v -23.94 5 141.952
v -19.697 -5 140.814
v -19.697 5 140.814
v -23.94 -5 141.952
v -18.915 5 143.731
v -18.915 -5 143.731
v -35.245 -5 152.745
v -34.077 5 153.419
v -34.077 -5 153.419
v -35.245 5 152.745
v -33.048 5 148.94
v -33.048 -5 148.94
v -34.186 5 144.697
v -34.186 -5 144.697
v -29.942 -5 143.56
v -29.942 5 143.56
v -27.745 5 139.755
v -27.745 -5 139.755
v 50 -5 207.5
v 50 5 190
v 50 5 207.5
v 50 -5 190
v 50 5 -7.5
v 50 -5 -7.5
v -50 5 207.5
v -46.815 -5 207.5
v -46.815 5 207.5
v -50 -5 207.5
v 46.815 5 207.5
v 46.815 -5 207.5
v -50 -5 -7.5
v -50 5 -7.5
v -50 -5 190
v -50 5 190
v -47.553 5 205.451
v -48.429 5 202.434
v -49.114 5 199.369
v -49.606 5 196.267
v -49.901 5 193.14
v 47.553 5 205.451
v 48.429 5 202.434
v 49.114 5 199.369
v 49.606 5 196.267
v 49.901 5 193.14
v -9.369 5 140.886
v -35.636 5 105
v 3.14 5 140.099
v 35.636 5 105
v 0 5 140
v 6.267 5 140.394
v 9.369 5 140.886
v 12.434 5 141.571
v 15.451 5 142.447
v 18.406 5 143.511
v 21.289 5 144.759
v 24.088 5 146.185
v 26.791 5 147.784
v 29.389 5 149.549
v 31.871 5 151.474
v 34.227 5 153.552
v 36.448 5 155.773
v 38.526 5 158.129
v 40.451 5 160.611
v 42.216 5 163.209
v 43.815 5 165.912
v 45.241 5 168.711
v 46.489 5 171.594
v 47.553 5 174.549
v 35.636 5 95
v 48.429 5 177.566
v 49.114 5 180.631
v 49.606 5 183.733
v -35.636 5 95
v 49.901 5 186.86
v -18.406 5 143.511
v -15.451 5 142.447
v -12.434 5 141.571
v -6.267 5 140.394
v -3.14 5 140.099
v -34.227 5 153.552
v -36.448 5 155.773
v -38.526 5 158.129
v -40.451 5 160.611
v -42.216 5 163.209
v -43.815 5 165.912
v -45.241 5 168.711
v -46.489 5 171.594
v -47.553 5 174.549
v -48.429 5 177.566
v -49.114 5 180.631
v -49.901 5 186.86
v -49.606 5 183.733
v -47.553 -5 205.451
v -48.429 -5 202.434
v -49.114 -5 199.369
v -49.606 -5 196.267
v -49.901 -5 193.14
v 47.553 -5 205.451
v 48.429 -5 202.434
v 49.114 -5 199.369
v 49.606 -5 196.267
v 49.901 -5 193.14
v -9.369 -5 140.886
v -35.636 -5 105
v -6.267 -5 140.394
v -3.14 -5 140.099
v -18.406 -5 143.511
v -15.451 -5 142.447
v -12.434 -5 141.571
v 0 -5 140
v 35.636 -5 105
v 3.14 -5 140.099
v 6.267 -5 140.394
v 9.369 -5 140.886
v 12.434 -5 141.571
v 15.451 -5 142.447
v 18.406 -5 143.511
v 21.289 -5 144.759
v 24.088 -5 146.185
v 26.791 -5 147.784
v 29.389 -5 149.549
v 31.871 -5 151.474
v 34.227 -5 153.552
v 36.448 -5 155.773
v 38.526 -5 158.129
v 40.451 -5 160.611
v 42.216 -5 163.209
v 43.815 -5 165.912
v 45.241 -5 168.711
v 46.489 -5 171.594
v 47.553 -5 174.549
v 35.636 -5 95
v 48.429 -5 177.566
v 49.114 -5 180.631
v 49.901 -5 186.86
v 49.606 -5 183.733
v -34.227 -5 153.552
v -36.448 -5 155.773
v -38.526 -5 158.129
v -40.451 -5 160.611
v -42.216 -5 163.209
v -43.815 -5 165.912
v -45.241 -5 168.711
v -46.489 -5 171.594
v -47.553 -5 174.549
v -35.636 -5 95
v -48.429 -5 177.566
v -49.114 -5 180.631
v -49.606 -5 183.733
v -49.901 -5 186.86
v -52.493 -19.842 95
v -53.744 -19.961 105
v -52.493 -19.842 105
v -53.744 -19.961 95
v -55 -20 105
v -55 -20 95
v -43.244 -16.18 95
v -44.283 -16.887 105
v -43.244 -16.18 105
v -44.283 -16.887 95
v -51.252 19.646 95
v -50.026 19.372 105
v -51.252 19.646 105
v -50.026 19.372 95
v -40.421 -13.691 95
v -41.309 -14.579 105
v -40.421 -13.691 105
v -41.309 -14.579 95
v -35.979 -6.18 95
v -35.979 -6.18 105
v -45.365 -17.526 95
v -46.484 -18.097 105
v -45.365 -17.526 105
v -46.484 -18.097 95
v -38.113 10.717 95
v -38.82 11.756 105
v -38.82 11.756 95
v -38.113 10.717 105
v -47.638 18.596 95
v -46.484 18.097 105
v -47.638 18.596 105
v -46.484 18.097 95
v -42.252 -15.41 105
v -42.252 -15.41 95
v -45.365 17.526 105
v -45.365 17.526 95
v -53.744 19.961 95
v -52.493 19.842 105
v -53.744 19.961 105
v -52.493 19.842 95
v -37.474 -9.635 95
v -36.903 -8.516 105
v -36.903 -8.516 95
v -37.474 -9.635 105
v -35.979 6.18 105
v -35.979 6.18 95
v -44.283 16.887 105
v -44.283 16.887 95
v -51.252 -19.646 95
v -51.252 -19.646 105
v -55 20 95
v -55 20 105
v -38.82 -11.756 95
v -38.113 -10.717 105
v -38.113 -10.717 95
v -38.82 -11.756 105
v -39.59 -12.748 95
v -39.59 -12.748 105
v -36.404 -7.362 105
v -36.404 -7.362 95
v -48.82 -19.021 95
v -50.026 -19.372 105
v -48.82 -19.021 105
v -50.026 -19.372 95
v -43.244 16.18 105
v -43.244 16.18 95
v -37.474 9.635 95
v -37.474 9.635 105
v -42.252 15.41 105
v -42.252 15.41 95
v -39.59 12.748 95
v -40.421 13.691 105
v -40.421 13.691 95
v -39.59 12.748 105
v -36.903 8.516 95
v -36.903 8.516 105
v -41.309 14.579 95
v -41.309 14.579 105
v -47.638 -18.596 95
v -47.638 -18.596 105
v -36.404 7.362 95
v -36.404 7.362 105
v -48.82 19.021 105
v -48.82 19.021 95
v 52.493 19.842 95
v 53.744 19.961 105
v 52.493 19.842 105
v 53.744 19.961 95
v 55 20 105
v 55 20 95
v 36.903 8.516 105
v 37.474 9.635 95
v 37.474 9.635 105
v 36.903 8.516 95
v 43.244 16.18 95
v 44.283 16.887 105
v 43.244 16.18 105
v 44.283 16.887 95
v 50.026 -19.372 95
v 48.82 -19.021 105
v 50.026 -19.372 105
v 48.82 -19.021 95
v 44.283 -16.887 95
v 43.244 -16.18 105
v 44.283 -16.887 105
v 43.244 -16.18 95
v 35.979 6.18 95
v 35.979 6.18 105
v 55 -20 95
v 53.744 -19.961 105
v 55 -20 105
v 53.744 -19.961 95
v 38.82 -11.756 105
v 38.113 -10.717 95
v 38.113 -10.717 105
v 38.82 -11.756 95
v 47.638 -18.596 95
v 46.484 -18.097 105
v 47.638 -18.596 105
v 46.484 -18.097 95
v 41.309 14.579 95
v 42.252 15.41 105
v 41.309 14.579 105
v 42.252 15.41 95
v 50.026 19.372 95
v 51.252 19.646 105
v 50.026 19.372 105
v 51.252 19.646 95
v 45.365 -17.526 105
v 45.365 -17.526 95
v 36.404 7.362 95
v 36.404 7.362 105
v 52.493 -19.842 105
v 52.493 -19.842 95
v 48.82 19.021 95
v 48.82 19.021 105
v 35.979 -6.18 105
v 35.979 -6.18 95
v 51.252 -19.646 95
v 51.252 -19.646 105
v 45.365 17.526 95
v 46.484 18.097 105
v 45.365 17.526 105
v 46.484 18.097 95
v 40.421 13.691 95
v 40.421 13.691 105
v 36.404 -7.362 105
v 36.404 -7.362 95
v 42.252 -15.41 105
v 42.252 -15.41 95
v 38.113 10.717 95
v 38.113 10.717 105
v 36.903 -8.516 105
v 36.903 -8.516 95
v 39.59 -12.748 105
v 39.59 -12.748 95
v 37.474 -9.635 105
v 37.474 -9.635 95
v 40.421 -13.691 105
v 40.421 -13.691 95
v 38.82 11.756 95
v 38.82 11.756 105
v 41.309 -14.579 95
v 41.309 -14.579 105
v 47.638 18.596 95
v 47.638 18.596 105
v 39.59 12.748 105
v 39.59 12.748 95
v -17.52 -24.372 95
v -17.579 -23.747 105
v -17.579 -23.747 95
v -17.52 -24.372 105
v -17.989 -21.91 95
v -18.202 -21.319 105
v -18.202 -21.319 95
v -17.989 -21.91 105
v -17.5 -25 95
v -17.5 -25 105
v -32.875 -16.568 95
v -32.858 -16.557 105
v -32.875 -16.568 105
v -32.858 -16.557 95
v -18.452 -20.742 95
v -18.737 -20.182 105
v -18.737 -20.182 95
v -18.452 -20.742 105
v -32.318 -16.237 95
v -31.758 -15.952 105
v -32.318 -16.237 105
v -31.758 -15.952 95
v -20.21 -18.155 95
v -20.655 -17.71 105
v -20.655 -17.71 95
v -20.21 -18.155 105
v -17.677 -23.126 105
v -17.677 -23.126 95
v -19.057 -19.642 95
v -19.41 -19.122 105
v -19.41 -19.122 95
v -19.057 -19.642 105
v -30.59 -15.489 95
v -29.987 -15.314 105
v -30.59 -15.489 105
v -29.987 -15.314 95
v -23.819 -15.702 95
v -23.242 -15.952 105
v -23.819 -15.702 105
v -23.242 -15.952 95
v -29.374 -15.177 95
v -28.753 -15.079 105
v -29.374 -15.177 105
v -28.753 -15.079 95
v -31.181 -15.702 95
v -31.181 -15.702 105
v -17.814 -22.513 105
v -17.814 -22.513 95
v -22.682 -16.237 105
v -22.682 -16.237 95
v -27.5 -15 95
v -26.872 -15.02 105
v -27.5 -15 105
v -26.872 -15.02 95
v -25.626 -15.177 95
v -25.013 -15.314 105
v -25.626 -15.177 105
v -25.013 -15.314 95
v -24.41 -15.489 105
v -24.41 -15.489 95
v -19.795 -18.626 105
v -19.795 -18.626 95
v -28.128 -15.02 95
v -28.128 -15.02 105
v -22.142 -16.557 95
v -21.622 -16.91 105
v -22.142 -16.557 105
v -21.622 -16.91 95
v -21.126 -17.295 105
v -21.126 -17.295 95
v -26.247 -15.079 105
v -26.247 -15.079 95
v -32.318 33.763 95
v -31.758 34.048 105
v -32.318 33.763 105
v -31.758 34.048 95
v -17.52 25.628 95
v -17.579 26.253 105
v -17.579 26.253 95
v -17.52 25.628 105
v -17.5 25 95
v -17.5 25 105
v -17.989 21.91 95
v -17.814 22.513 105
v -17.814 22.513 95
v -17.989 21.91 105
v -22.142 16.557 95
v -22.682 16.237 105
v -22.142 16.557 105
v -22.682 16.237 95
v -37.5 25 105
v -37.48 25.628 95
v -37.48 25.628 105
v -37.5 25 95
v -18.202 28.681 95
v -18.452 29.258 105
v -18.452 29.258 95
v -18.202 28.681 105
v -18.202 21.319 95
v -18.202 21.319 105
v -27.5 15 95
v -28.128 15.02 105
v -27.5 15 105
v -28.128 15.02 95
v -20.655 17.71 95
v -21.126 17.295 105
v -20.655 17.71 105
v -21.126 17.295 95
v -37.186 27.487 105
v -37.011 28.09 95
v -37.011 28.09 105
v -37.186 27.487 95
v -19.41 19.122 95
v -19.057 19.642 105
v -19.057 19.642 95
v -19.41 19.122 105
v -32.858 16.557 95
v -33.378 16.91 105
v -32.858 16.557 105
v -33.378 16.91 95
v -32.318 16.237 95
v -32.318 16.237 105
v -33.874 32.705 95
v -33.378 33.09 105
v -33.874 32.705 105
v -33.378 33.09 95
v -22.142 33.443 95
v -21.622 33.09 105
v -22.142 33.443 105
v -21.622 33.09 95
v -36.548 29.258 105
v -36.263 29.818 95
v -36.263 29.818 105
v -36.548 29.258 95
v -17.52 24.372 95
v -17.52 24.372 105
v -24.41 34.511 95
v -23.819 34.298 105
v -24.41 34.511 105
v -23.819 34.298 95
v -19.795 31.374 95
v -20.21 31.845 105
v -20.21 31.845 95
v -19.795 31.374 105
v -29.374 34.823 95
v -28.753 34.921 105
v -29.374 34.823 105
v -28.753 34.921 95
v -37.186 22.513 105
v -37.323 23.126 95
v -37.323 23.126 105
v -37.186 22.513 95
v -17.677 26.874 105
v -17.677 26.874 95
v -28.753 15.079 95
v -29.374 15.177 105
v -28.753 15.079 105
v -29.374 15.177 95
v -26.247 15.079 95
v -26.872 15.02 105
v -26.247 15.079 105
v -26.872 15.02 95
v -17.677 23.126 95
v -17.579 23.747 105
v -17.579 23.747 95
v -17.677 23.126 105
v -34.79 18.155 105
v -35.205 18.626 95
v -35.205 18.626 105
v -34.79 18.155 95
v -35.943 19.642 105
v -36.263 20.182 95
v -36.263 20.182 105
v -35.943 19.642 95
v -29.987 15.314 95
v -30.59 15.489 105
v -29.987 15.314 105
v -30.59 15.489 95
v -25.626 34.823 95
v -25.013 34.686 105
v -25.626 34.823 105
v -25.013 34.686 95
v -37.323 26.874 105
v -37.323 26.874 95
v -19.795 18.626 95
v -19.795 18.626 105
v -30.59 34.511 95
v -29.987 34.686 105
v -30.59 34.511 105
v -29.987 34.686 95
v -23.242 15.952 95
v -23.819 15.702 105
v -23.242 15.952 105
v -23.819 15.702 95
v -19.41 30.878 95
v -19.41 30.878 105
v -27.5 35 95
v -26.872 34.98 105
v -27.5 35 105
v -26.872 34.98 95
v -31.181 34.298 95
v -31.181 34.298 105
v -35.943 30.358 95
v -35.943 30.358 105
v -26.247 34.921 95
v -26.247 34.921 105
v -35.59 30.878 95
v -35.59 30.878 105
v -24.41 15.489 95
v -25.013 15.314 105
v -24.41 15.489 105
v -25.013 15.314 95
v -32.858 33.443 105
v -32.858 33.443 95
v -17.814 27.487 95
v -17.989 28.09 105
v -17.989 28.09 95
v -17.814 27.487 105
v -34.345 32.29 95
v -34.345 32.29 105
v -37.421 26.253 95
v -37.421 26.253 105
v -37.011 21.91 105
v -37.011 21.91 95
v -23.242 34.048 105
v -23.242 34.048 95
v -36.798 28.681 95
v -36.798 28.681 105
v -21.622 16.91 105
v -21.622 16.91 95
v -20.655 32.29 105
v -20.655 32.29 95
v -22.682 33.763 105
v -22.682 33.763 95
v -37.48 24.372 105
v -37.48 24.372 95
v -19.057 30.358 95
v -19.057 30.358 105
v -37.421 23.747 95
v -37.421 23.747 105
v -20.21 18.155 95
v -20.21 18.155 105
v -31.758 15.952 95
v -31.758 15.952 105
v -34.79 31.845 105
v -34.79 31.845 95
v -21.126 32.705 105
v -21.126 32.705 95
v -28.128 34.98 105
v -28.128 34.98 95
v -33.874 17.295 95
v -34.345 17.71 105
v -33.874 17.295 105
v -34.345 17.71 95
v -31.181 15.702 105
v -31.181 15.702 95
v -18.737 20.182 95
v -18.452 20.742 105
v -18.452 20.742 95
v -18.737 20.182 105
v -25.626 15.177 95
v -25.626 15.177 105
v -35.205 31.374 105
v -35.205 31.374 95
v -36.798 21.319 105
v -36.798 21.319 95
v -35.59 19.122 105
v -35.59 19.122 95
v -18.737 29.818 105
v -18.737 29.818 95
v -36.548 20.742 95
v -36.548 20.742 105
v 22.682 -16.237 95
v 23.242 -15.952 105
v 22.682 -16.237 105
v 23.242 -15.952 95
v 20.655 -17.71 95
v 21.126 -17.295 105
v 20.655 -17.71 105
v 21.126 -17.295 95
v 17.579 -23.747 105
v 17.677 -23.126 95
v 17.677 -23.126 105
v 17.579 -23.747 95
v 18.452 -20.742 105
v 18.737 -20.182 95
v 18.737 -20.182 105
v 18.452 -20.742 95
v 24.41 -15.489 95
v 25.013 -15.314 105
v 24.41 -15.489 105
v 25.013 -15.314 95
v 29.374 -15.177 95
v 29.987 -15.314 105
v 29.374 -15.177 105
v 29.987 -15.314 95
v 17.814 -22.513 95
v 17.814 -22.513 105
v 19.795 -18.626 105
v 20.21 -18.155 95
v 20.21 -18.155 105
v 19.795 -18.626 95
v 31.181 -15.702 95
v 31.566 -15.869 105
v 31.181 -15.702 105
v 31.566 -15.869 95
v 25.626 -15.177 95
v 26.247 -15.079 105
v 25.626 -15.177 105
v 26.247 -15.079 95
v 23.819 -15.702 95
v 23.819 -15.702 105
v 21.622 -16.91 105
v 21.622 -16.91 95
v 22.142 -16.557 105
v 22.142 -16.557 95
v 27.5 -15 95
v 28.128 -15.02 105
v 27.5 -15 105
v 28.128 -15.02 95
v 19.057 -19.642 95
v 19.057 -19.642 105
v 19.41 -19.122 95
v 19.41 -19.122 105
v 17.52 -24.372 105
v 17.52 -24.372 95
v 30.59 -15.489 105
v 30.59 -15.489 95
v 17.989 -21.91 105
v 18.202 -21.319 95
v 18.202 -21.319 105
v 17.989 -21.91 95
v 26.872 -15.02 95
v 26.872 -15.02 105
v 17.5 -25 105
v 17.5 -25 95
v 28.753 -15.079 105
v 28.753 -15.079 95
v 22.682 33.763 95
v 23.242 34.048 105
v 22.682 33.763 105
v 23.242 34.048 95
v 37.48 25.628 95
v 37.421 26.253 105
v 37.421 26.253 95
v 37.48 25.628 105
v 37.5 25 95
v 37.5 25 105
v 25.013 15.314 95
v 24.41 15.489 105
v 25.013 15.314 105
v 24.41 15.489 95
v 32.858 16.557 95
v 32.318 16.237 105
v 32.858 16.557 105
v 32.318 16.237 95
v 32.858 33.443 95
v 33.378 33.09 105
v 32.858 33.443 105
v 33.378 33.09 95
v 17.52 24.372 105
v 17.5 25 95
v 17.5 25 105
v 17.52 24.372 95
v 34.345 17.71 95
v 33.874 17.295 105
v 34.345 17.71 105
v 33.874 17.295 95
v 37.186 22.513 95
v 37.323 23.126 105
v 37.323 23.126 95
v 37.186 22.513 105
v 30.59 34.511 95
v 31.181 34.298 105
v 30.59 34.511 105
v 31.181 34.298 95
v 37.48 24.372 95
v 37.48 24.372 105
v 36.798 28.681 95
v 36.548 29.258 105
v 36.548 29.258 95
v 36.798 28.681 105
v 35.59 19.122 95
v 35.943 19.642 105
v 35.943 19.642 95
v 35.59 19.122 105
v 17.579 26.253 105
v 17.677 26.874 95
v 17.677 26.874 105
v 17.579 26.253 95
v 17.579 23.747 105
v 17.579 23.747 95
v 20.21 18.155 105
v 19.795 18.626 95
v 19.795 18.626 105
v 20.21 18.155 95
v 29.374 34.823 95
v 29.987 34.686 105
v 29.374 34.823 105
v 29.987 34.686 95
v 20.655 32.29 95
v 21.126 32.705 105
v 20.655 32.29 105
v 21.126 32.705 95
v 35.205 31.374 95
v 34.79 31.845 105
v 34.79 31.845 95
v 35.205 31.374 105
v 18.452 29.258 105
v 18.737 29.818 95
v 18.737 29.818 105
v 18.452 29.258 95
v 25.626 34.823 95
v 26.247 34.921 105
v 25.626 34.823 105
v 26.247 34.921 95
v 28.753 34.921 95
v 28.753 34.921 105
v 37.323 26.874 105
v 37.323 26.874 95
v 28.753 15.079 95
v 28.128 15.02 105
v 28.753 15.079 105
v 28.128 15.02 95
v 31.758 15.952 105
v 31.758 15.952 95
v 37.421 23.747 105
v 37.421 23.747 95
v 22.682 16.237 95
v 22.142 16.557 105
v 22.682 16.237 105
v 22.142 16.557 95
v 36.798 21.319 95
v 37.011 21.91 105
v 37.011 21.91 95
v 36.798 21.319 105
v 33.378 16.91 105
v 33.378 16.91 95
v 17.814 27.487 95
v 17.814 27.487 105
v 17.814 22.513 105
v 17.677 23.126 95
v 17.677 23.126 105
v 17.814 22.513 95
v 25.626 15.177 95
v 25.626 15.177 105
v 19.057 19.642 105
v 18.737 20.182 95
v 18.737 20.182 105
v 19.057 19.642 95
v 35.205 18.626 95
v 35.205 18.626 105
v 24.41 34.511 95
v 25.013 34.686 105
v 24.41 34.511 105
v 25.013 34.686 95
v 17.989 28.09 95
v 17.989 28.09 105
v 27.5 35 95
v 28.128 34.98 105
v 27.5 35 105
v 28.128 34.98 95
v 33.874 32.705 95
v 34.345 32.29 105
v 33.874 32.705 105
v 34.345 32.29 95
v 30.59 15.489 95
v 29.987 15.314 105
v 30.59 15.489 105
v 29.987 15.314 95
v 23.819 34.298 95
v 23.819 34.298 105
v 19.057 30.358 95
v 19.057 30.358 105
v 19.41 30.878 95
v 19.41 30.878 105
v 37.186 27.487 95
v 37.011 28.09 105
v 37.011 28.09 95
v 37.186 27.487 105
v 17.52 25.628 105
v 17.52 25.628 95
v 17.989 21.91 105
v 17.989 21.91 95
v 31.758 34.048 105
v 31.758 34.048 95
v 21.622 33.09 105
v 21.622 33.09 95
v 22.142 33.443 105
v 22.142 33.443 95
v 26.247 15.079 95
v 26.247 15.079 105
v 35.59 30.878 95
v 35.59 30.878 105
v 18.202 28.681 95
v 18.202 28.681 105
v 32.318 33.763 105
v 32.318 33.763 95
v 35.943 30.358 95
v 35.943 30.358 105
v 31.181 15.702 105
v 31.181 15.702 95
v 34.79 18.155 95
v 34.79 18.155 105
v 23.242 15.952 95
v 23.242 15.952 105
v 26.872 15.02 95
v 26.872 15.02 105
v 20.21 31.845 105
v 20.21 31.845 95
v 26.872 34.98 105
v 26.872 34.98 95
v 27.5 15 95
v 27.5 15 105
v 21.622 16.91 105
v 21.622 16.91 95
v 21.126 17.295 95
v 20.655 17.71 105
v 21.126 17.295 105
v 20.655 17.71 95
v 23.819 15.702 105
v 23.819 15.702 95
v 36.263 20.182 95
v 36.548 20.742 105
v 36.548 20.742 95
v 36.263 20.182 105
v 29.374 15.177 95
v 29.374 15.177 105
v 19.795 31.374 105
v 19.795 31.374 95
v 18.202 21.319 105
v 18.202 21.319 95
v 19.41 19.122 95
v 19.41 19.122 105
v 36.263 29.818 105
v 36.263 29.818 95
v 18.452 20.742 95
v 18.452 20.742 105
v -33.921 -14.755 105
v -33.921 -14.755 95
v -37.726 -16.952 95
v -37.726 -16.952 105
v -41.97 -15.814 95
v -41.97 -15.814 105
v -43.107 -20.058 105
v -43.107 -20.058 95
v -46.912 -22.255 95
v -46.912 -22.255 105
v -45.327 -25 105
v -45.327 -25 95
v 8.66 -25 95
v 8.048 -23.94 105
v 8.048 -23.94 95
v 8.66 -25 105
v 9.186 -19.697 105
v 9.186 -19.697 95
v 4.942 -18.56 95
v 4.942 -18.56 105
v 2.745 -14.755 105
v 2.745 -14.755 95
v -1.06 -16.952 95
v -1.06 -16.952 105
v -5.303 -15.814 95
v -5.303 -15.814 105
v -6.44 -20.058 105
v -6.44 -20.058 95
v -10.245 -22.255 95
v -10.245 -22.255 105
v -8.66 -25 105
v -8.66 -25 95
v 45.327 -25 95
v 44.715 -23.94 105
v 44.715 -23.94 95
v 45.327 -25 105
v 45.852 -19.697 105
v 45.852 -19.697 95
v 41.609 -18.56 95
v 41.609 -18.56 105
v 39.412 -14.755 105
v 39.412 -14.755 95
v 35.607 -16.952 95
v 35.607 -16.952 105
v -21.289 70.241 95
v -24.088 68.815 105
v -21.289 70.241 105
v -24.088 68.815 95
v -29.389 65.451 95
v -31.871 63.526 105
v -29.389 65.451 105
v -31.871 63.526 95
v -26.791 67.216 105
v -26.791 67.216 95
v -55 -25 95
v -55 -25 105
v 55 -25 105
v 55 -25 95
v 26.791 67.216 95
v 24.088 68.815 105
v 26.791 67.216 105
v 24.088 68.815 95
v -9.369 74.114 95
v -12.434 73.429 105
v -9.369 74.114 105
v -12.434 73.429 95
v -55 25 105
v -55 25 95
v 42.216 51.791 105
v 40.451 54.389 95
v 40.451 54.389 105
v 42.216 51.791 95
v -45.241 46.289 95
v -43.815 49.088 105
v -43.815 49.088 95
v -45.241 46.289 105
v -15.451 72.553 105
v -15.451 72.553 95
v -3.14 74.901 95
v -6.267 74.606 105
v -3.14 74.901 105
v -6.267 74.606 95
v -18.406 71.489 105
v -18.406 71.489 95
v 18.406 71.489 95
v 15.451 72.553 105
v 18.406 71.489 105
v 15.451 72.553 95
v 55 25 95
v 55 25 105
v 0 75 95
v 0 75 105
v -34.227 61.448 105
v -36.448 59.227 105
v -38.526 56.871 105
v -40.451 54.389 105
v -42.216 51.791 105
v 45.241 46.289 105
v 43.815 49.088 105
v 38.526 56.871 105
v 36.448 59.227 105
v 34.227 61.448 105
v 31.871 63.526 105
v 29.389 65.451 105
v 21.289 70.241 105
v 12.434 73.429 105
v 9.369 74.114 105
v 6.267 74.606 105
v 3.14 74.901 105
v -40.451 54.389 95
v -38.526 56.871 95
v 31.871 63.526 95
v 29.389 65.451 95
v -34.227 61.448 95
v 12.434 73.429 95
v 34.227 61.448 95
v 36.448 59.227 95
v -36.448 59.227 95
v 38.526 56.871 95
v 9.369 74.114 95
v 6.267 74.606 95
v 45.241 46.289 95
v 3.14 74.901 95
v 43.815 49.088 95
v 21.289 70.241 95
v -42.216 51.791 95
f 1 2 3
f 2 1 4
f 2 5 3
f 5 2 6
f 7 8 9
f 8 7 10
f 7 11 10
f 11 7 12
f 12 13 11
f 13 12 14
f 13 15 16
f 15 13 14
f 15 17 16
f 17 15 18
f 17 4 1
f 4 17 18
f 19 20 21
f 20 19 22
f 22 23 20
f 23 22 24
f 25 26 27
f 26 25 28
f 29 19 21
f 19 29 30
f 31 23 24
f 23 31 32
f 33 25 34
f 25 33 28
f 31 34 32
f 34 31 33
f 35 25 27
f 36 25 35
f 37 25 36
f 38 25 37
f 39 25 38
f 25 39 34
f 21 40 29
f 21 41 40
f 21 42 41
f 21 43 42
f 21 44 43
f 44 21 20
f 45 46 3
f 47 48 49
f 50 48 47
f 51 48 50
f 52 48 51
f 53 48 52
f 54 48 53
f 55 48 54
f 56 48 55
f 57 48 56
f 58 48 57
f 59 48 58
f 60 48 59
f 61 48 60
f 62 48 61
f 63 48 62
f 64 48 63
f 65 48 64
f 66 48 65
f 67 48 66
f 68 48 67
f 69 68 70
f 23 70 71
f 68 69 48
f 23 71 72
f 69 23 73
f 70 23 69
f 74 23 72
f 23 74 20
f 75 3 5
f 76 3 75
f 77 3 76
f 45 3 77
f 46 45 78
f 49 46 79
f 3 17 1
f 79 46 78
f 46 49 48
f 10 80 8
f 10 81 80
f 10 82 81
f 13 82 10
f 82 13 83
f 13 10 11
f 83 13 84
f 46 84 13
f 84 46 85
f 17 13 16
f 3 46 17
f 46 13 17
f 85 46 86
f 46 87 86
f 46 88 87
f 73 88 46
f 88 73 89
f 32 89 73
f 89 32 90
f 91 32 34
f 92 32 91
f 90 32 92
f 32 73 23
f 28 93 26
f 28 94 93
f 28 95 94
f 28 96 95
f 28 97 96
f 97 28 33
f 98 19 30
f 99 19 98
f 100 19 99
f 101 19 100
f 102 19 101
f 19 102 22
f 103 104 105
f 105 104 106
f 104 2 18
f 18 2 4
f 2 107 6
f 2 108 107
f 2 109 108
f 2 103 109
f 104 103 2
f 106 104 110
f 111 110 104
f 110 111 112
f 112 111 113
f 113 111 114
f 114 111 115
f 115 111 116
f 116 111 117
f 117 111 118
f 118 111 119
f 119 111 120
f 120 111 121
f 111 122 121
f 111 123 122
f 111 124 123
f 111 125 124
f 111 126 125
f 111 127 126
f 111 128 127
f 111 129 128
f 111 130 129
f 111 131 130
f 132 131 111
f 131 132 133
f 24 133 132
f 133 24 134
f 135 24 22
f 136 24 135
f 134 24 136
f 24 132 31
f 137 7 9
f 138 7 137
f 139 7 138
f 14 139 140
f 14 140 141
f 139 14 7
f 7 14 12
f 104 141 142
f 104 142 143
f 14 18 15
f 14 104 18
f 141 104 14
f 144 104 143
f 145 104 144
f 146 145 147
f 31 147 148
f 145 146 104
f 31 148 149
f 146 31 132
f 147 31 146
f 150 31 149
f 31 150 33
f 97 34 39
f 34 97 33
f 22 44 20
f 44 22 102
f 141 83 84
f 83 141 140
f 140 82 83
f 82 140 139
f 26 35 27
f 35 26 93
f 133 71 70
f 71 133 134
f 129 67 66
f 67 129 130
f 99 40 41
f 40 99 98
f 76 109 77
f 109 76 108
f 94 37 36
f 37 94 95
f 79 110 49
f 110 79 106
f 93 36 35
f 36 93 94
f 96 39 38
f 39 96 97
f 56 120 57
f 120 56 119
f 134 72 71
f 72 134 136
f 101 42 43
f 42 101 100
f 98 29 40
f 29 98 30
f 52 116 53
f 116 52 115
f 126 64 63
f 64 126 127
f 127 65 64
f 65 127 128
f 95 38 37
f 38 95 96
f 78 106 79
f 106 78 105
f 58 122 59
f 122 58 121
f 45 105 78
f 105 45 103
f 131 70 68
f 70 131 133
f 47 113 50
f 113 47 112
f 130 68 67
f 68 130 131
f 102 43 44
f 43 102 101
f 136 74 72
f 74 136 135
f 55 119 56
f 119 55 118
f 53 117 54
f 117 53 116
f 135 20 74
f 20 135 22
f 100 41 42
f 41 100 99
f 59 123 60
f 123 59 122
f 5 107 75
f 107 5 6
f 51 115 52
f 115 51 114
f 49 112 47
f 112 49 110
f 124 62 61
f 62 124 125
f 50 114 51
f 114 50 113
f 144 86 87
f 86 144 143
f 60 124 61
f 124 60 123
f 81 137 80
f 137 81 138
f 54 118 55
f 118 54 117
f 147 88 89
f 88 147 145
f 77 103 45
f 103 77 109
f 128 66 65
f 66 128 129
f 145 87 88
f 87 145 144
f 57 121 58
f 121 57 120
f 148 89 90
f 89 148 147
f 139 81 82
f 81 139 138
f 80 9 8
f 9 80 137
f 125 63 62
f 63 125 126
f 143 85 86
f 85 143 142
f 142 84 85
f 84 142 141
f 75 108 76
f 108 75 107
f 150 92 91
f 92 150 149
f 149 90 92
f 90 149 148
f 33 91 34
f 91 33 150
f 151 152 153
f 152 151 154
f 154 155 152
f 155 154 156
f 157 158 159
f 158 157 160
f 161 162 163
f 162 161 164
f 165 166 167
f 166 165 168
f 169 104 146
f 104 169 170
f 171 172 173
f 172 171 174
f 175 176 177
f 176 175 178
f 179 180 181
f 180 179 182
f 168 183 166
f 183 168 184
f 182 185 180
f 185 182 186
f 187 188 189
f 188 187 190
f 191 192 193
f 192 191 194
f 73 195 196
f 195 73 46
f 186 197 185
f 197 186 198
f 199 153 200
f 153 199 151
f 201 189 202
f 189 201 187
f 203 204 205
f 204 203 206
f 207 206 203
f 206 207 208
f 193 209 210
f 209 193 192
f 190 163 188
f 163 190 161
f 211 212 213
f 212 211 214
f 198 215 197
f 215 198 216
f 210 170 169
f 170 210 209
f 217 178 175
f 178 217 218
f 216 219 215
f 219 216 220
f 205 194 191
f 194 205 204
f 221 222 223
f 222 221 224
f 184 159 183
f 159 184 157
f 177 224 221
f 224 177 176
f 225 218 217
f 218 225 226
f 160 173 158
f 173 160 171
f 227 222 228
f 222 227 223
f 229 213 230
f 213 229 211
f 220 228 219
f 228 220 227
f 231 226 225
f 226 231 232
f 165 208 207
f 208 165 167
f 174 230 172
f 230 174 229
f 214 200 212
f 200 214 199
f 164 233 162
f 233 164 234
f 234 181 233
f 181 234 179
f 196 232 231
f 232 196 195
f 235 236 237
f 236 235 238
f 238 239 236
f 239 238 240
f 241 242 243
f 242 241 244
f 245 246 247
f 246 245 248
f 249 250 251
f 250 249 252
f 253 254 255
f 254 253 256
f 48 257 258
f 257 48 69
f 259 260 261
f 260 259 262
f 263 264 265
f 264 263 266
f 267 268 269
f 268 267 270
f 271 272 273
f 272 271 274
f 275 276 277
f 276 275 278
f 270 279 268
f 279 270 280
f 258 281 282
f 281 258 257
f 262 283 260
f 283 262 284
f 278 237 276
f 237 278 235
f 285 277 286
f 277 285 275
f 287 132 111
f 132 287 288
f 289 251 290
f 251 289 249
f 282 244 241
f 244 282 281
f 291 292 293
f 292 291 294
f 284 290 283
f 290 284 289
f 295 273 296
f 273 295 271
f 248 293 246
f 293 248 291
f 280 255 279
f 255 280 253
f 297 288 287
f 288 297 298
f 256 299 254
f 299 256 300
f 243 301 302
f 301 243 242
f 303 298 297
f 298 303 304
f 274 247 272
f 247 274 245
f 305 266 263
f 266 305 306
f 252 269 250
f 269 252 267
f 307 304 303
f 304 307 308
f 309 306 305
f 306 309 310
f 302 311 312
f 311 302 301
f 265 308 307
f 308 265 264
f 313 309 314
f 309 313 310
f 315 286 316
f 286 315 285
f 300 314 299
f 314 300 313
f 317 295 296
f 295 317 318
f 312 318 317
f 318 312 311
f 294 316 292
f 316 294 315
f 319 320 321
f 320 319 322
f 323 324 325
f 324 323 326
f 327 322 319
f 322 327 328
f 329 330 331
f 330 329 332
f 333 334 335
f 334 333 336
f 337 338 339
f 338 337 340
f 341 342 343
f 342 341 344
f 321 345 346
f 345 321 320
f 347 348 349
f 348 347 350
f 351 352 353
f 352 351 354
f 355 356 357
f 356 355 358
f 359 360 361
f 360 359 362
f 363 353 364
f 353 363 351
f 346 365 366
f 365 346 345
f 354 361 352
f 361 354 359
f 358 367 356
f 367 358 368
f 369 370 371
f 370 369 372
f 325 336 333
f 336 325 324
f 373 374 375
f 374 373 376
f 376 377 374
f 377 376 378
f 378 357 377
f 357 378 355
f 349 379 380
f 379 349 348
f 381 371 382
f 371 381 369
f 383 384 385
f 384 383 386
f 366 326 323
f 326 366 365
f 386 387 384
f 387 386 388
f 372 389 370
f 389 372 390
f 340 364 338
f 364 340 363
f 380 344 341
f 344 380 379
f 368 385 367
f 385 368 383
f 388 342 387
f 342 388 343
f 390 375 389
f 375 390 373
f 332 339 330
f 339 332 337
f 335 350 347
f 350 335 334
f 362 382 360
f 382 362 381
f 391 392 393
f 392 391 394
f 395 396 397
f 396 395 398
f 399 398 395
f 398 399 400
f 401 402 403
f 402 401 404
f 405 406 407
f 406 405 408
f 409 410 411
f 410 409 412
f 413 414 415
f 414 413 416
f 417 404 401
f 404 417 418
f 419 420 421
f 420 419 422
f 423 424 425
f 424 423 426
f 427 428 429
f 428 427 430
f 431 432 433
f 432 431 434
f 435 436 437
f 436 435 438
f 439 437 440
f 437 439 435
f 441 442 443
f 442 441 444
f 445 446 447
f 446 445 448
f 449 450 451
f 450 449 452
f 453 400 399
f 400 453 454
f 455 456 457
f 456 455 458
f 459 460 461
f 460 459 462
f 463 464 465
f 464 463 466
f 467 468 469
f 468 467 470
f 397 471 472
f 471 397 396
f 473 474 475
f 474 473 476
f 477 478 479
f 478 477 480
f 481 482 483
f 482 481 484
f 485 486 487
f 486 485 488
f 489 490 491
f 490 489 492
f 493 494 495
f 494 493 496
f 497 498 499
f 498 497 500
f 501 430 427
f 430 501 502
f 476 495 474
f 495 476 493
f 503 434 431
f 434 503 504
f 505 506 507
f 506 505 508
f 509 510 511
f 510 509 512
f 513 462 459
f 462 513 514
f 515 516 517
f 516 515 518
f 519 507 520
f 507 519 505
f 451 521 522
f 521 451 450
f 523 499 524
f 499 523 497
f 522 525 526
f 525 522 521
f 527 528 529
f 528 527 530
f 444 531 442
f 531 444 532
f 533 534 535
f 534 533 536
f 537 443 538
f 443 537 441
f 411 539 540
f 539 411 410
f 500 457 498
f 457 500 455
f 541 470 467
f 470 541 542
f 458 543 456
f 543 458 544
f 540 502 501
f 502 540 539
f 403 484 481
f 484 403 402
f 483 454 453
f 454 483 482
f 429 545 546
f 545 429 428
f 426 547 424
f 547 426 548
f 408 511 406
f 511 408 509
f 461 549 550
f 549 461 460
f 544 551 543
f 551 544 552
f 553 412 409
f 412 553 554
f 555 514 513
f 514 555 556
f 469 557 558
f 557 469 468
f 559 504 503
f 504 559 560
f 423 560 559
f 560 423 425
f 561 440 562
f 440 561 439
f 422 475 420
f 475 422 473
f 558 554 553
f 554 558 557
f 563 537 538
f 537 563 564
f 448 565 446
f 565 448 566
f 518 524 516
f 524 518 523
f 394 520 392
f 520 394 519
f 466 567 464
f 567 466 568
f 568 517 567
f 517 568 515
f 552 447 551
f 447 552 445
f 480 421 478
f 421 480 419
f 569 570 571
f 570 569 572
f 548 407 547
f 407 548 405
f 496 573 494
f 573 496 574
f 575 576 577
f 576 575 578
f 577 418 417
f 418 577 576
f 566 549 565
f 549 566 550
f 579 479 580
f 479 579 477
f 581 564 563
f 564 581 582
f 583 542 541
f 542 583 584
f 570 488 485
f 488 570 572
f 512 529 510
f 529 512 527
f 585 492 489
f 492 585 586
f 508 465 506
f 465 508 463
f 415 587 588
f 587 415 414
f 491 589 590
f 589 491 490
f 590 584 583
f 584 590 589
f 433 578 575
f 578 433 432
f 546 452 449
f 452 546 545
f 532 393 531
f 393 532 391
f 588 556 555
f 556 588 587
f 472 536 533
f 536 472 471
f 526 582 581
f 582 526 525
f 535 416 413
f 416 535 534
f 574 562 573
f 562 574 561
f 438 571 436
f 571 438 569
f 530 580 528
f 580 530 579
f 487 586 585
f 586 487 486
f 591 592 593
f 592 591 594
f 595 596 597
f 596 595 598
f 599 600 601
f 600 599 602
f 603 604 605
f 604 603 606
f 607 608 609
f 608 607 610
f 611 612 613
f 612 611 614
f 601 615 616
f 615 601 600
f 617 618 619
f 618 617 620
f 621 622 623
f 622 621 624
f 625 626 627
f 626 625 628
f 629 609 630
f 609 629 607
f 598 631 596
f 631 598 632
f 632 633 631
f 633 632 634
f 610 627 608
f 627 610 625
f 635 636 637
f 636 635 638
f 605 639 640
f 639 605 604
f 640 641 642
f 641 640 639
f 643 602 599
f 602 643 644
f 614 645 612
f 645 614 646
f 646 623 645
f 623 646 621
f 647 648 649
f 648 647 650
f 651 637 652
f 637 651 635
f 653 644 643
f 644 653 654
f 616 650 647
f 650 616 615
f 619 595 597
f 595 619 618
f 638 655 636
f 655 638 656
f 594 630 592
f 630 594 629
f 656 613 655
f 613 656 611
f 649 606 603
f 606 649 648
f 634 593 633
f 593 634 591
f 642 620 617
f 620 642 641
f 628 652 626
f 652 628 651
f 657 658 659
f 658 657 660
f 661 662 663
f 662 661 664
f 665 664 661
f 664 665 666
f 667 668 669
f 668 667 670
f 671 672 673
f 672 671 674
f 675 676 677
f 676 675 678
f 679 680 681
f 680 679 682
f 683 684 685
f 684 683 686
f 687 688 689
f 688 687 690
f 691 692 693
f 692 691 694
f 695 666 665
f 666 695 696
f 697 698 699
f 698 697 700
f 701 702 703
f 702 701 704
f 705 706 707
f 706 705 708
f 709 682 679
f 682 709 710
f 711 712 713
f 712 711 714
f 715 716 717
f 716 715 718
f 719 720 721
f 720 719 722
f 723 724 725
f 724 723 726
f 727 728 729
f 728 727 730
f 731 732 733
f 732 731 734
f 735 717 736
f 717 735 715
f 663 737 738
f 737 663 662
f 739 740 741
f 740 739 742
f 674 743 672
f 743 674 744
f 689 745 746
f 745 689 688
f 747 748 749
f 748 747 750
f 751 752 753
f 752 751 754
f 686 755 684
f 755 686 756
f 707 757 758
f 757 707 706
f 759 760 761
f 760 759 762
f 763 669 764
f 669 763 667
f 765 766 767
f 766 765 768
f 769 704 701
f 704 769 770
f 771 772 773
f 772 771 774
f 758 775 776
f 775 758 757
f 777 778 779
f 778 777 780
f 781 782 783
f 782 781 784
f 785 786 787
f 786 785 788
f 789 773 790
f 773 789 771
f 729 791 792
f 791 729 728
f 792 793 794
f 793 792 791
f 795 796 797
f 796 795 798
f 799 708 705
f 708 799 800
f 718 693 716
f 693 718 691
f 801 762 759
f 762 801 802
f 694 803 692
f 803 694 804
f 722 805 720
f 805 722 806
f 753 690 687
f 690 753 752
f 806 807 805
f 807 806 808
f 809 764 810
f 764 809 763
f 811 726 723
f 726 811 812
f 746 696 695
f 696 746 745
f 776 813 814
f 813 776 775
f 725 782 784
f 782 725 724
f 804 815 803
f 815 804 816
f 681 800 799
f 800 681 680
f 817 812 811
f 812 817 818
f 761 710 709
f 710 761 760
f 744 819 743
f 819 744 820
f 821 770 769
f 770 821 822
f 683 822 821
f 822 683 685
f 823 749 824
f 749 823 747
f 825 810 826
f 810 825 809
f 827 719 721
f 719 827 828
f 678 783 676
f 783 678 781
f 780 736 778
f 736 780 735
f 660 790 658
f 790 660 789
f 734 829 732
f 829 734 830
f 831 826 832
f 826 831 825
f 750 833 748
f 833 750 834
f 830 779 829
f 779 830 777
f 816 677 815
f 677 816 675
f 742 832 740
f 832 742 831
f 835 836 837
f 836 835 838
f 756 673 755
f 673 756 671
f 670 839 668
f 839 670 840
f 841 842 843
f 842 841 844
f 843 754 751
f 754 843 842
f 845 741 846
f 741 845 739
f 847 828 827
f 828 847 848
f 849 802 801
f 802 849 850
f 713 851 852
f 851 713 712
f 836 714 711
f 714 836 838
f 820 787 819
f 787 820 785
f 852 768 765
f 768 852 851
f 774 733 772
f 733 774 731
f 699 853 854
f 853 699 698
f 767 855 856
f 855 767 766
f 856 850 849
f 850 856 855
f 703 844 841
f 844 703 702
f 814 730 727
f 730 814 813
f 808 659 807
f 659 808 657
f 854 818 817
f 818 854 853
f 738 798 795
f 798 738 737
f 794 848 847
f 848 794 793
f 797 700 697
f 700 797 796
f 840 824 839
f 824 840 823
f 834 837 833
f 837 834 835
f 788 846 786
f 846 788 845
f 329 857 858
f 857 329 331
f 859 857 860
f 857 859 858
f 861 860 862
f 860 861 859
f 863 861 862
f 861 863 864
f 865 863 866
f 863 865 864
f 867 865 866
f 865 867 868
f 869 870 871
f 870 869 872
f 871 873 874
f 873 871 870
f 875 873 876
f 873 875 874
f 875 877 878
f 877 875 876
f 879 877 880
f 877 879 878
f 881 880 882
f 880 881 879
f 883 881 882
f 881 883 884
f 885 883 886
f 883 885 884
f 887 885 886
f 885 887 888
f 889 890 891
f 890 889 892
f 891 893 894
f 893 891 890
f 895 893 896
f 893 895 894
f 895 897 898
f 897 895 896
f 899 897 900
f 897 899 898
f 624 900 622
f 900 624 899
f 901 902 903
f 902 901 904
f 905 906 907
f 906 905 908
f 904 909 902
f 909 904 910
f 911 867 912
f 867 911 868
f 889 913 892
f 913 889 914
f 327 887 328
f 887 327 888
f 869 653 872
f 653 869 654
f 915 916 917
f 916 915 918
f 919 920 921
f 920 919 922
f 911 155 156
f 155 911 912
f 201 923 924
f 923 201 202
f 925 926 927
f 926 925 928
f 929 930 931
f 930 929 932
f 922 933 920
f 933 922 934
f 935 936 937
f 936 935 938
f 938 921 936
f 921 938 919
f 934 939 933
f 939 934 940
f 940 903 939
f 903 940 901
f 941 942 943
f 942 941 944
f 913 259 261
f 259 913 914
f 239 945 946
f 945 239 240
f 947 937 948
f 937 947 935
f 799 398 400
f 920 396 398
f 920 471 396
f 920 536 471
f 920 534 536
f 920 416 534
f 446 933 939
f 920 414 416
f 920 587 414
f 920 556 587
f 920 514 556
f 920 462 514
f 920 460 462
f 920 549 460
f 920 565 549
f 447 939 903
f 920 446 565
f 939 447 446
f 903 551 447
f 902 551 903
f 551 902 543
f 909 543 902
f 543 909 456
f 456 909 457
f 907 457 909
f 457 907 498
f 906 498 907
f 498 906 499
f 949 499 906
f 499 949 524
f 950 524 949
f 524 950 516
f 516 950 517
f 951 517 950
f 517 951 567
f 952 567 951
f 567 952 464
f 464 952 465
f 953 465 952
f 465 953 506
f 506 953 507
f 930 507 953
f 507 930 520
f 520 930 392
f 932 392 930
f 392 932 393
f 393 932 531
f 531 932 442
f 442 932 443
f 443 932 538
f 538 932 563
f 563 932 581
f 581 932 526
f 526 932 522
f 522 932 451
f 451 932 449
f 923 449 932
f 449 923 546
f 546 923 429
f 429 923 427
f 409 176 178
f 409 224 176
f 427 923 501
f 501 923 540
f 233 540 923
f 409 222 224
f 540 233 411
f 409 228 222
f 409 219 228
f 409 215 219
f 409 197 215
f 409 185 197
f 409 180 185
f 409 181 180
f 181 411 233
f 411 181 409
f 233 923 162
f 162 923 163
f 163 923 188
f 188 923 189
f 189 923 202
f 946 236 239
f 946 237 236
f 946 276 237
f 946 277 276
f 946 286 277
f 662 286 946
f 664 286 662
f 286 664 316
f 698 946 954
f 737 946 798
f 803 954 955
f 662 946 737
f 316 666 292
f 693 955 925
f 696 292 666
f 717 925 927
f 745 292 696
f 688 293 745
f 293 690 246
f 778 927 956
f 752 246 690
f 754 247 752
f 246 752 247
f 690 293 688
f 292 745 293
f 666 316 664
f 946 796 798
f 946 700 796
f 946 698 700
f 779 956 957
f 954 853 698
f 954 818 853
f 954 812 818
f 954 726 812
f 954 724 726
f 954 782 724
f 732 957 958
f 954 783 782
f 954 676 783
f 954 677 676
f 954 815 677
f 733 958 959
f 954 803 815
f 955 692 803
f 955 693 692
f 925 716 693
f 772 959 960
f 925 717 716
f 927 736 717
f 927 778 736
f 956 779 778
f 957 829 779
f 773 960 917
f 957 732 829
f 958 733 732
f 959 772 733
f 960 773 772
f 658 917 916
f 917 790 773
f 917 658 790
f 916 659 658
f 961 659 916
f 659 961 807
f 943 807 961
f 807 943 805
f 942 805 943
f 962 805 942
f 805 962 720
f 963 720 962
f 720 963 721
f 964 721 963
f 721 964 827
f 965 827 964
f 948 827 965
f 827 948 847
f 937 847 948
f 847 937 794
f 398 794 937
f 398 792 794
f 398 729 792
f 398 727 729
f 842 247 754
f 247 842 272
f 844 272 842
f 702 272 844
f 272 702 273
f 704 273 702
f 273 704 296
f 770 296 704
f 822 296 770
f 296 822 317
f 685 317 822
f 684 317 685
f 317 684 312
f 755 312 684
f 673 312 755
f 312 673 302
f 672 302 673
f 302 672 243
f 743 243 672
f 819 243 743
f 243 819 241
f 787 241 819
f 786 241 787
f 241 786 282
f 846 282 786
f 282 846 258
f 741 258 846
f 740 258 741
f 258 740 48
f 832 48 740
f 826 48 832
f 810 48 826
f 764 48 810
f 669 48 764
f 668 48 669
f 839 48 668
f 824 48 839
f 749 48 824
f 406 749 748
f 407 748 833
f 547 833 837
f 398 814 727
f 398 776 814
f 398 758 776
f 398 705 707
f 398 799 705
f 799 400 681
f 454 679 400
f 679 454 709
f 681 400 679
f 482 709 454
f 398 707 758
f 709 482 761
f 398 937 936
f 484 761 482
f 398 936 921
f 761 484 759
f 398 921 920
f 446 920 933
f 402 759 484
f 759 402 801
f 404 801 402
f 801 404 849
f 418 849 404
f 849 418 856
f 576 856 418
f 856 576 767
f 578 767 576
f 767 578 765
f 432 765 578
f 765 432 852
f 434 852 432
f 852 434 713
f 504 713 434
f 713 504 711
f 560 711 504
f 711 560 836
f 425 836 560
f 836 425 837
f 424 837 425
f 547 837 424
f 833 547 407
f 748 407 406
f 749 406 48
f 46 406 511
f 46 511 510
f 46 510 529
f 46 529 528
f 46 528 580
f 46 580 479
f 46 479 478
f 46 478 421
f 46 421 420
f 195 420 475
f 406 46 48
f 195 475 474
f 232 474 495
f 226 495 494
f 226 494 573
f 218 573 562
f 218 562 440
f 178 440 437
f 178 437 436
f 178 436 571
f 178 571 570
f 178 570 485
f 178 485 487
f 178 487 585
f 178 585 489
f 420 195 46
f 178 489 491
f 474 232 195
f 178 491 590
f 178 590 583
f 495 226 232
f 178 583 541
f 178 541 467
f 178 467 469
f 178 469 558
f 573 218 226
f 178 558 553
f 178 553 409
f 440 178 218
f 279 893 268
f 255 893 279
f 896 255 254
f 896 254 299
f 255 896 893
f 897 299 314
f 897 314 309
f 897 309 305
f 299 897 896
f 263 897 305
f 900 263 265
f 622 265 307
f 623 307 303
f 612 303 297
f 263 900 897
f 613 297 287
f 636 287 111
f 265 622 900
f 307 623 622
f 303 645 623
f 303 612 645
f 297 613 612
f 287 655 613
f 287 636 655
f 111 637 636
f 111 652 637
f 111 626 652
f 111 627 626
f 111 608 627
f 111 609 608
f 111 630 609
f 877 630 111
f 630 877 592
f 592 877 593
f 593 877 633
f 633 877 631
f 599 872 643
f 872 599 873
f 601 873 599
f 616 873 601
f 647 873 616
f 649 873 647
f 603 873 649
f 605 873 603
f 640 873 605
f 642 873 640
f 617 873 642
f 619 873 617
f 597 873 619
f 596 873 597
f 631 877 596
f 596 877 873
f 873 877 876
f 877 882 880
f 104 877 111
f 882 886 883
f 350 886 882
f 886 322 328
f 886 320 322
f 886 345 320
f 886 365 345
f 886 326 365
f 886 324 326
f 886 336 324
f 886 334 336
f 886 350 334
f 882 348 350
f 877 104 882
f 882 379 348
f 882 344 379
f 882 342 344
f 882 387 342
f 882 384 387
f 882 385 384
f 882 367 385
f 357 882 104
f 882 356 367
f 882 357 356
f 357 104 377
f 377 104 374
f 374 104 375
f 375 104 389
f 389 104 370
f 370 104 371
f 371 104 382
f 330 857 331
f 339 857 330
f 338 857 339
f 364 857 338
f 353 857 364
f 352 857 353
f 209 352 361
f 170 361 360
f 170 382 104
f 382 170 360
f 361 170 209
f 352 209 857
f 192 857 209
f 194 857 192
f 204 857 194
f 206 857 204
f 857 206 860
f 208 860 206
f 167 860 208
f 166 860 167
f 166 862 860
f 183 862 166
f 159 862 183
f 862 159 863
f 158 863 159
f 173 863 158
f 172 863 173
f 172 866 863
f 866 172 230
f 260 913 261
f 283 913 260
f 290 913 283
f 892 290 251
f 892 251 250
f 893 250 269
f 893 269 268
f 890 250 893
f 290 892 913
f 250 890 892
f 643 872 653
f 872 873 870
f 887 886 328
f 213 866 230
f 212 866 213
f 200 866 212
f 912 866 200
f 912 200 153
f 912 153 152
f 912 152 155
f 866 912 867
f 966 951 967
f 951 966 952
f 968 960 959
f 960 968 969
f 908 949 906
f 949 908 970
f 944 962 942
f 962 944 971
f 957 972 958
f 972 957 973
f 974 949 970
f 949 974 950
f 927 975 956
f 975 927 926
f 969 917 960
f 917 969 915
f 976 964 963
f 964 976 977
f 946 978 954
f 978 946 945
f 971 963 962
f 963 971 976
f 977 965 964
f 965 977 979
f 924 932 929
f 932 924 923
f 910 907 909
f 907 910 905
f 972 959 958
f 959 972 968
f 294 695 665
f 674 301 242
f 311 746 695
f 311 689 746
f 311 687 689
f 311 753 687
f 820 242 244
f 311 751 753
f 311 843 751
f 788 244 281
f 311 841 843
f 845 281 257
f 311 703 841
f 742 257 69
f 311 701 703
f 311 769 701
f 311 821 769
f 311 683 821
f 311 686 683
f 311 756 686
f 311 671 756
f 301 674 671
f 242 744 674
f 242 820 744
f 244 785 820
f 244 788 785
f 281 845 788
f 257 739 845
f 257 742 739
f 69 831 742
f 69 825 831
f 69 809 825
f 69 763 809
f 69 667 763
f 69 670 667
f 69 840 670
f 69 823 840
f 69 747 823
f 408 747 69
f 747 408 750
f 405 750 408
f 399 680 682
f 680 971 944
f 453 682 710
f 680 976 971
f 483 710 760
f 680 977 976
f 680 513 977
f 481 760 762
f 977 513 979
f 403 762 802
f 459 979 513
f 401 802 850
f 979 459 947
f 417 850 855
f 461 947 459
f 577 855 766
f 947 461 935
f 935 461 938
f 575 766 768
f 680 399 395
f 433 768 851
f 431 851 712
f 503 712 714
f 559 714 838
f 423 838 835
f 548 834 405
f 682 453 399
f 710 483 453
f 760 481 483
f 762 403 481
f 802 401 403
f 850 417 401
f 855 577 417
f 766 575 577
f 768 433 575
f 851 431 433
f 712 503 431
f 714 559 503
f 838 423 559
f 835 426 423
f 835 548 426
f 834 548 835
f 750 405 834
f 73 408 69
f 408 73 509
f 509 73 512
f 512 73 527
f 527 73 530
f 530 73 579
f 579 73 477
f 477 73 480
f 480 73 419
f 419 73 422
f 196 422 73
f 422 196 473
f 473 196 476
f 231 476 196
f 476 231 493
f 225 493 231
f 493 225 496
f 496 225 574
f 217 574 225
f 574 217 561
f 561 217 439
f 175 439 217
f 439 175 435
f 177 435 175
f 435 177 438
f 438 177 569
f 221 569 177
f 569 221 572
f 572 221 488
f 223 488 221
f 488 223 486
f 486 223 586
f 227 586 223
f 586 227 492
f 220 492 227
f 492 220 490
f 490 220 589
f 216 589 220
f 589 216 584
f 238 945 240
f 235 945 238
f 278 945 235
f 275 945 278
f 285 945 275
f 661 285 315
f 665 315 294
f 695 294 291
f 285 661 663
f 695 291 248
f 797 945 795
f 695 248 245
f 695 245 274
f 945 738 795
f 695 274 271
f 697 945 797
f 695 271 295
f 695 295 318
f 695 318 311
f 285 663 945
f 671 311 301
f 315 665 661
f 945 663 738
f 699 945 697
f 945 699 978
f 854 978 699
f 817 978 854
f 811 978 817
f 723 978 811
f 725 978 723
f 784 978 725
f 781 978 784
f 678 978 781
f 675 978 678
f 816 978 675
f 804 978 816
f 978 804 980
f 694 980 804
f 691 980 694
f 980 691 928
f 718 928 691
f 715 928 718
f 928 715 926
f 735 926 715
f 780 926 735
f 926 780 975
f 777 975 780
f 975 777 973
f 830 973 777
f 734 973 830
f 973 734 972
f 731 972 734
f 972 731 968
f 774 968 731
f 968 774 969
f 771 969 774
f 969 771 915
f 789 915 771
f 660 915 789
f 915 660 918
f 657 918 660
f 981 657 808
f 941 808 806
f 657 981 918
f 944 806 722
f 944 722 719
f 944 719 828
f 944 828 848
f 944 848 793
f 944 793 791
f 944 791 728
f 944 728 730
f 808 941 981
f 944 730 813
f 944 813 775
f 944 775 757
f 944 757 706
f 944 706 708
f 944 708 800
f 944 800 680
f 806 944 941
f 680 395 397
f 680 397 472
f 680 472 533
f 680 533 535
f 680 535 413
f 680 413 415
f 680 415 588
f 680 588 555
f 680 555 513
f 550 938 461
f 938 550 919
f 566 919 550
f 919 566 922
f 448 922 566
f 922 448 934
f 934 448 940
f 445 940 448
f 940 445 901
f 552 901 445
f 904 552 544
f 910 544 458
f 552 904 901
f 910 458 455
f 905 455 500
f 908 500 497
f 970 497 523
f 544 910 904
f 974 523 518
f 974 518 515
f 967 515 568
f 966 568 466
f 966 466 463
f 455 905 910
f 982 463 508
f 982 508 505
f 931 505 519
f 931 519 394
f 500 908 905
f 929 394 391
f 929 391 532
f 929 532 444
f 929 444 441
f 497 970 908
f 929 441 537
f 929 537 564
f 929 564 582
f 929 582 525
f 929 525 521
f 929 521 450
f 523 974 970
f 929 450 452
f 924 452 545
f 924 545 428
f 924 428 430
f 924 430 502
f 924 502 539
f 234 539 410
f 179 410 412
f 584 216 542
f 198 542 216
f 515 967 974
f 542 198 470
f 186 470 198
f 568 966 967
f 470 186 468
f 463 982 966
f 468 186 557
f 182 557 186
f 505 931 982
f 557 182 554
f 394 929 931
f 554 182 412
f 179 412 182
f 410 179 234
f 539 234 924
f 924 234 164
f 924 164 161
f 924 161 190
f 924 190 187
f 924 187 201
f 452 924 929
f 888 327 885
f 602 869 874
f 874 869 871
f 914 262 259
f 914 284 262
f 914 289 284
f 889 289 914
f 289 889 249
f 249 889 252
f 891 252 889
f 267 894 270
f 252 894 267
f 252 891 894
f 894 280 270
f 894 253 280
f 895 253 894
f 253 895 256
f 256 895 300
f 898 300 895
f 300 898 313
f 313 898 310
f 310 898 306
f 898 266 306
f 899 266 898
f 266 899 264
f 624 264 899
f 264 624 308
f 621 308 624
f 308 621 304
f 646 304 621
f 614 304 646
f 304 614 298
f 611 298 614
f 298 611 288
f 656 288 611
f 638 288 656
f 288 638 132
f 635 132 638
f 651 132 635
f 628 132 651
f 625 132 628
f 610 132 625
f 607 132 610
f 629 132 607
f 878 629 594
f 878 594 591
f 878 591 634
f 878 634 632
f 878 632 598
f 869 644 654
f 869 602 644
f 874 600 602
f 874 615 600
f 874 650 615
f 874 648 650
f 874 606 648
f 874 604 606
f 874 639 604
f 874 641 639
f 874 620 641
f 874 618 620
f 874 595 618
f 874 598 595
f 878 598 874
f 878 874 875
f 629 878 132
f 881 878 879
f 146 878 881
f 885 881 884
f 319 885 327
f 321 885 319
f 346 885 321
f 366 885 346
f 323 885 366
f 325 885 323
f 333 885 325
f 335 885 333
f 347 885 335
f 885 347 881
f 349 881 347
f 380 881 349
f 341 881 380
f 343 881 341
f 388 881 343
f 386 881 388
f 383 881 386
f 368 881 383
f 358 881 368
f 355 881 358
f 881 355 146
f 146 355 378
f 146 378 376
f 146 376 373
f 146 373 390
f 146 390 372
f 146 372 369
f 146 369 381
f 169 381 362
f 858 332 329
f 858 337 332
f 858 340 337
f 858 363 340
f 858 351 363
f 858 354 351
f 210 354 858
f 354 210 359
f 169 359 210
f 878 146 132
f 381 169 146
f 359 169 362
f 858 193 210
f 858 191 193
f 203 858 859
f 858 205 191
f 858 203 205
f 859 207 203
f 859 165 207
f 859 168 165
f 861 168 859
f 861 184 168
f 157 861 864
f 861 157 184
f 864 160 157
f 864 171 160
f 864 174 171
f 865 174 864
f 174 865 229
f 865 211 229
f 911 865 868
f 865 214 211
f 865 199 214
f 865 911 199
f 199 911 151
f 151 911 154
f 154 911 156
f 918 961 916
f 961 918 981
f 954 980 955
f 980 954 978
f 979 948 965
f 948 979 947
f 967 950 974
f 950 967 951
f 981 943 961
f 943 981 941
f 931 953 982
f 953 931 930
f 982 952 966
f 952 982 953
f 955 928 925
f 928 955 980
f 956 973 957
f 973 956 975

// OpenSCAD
// Parametric Chair Assembly
// Based on Fusion360 reconstruction

// Global parameters
$fn = 100;

// ===== BRACKET PARAMETERS =====
bracket_width = 110;        // X dimension
bracket_depth = 100;        // Y dimension  
bracket_height = 215;       // Z dimension (vertical plate)
bracket_thickness = 10;     // Plate and base thickness

// Backrest parameters
backrest_point_height = 180; // Height to pointed tip
backrest_width = 100;       // Width of vertical plate
leaf_curve_radius = 150;    // Radius for leaf contour curve

// Base parameters
base_depth = 100;           // Depth of horizontal base
base_width = 110;           // Width of horizontal base
base_arc_radius = 50;       // Semicircular arc on base sides
base_side_curve_radius = 20; // Additional curved contours
base_small_curve_radius = 10;

// Diamond cutout parameters
diamond_size = 15;          // Size of diamond cutouts
diamond_tilt = 30;          // Tilt angle from axes (degrees)
diamond_count = 5;          // Number of diamond cutouts on backrest
diamond_base_count = 3;     // Number of diamond cutouts on base

// ===== LEG PARAMETERS =====
leg_width = 25;             // X dimension
leg_depth = 25;             // Y dimension
leg_height = 100;           // Z dimension
leg_fillet_radius = 2;      // Vertical edge fillets

// Concave cylinder parameters for waisted profile
leg_concave_radius1 = 130;  // Upper concave radius
leg_concave_radius2 = 145;  // Lower concave radius
leg_chamfer_height = 5;     // Height of end chamfers

// ===== ASSEMBLY PARAMETERS =====
seat_height = 100;          // Height from floor to seat top
leg_spacing_x = 70;         // Spacing between legs in X direction
leg_spacing_y = 60;         // Spacing between legs in Y direction

// ===== MODULES =====

// Diamond cutout shape (2D)
module diamond_shape(size, tilt) {
    rotate([0, 0, tilt])
    square([size, size], center=true);
    rotate([0, 0, tilt + 45])
    square([size, size], center=true);
}

// Waisted leg profile (2D cross-section)
module leg_profile() {
    // Square with concave sides
    difference() {
        // Base square
        square([leg_width, leg_depth], center=true);
        
        // Concave cuts on each side
        for (angle = [0, 90, 180, 270]) {
            rotate([0, 0, angle])
            translate([leg_width/2, 0, 0])
            circle(r=leg_concave_radius1, $fn=200);
        }
    }
}

// Complete leg module
module leg() {
    linear_extrude(height=leg_height, center=true) {
        // Main leg profile with fillets
        offset(r=leg_fillet_radius)
        offset(r=-leg_fillet_radius)
        leg_profile();
    }
    
    // Add chamfers at top and bottom
    for (z = [-leg_height/2 + leg_chamfer_height/2, 
               leg_height/2 - leg_chamfer_height/2]) {
        translate([0, 0, z])
        linear_extrude(height=leg_chamfer_height, center=true) {
            offset(r=leg_fillet_radius)
            offset(r=-leg_fillet_radius)
            scale([1.2, 1.2]) // Flared chamfer
            leg_profile();
        }
    }
}

// Decorative bracket module
module decorative_bracket() {
    union() {
        // Vertical backrest plate
        difference() {
            // Main plate
            cube([backrest_width, bracket_thickness, bracket_height], 
                 center=true);
            
            // Pointed leaf contour (simplified as curve)
            translate([0, 0, backrest_point_height/2])
            rotate([90, 0, 0])
            linear_extrude(height=bracket_thickness*2, center=true)
            hull() {
                circle(d=backrest_width);
                translate([0, backrest_point_height - backrest_width/2, 0])
                circle(d=1);
            }
            
            // Diamond cutouts on backrest
            for (i = [0:diamond_count-1]) {
                translate([
                    -backrest_width/4 + (i % 2) * backrest_width/2,
                    0,
                    50 + i * 30
                ])
                rotate([90, 0, 0])
                linear_extrude(height=bracket_thickness*2, center=true)
                diamond_shape(diamond_size, diamond_tilt);
            }
        }
        
        // Horizontal base
        difference() {
            // Main base with rounded front
            hull() {
                // Main rectangular part
                cube([base_width, base_depth - base_arc_radius, 
                      bracket_thickness], center=true);
                
                // Semicircular front
                translate([0, (base_depth - base_arc_radius)/2, 0])
                rotate([0, 0, 90])
                linear_extrude(height=bracket_thickness, center=true)
                circle(r=base_arc_radius);
            }
            
            // Side curved cutouts
            for (side = [-1, 1]) {
                translate([side * base_width/2, 0, 0])
                rotate([0, 0, side * 90])
                linear_extrude(height=bracket_thickness*2, center=true)
                circle(r=base_side_curve_radius);
            }
            
            // Small curved cutouts
            for (x = [-1, 1], y = [-1, 1]) {
                translate([x * base_width/4, y * base_depth/4, 0])
                linear_extrude(height=bracket_thickness*2, center=true)
                circle(r=base_small_curve_radius);
            }
            
            // Diamond cutouts on base
            for (i = [0:diamond_base_count-1]) {
                translate([
                    -base_width/3 + i * base_width/3,
                    -base_depth/4,
                    0
                ])
                linear_extrude(height=bracket_thickness*2, center=true)
                diamond_shape(diamond_size, diamond_tilt);
            }
        }
    }
}

// ===== ASSEMBLY =====
union() {
    // Decorative bracket (seat and backrest)
    translate([0, 0, seat_height])
    decorative_bracket();
    
    // Four legs
    for (x = [-1, 1], y = [-1, 1]) {
        translate([
            x * leg_spacing_x/2,
            y * leg_spacing_y/2,
            leg_height/2
        ])
        leg();
    }
}
